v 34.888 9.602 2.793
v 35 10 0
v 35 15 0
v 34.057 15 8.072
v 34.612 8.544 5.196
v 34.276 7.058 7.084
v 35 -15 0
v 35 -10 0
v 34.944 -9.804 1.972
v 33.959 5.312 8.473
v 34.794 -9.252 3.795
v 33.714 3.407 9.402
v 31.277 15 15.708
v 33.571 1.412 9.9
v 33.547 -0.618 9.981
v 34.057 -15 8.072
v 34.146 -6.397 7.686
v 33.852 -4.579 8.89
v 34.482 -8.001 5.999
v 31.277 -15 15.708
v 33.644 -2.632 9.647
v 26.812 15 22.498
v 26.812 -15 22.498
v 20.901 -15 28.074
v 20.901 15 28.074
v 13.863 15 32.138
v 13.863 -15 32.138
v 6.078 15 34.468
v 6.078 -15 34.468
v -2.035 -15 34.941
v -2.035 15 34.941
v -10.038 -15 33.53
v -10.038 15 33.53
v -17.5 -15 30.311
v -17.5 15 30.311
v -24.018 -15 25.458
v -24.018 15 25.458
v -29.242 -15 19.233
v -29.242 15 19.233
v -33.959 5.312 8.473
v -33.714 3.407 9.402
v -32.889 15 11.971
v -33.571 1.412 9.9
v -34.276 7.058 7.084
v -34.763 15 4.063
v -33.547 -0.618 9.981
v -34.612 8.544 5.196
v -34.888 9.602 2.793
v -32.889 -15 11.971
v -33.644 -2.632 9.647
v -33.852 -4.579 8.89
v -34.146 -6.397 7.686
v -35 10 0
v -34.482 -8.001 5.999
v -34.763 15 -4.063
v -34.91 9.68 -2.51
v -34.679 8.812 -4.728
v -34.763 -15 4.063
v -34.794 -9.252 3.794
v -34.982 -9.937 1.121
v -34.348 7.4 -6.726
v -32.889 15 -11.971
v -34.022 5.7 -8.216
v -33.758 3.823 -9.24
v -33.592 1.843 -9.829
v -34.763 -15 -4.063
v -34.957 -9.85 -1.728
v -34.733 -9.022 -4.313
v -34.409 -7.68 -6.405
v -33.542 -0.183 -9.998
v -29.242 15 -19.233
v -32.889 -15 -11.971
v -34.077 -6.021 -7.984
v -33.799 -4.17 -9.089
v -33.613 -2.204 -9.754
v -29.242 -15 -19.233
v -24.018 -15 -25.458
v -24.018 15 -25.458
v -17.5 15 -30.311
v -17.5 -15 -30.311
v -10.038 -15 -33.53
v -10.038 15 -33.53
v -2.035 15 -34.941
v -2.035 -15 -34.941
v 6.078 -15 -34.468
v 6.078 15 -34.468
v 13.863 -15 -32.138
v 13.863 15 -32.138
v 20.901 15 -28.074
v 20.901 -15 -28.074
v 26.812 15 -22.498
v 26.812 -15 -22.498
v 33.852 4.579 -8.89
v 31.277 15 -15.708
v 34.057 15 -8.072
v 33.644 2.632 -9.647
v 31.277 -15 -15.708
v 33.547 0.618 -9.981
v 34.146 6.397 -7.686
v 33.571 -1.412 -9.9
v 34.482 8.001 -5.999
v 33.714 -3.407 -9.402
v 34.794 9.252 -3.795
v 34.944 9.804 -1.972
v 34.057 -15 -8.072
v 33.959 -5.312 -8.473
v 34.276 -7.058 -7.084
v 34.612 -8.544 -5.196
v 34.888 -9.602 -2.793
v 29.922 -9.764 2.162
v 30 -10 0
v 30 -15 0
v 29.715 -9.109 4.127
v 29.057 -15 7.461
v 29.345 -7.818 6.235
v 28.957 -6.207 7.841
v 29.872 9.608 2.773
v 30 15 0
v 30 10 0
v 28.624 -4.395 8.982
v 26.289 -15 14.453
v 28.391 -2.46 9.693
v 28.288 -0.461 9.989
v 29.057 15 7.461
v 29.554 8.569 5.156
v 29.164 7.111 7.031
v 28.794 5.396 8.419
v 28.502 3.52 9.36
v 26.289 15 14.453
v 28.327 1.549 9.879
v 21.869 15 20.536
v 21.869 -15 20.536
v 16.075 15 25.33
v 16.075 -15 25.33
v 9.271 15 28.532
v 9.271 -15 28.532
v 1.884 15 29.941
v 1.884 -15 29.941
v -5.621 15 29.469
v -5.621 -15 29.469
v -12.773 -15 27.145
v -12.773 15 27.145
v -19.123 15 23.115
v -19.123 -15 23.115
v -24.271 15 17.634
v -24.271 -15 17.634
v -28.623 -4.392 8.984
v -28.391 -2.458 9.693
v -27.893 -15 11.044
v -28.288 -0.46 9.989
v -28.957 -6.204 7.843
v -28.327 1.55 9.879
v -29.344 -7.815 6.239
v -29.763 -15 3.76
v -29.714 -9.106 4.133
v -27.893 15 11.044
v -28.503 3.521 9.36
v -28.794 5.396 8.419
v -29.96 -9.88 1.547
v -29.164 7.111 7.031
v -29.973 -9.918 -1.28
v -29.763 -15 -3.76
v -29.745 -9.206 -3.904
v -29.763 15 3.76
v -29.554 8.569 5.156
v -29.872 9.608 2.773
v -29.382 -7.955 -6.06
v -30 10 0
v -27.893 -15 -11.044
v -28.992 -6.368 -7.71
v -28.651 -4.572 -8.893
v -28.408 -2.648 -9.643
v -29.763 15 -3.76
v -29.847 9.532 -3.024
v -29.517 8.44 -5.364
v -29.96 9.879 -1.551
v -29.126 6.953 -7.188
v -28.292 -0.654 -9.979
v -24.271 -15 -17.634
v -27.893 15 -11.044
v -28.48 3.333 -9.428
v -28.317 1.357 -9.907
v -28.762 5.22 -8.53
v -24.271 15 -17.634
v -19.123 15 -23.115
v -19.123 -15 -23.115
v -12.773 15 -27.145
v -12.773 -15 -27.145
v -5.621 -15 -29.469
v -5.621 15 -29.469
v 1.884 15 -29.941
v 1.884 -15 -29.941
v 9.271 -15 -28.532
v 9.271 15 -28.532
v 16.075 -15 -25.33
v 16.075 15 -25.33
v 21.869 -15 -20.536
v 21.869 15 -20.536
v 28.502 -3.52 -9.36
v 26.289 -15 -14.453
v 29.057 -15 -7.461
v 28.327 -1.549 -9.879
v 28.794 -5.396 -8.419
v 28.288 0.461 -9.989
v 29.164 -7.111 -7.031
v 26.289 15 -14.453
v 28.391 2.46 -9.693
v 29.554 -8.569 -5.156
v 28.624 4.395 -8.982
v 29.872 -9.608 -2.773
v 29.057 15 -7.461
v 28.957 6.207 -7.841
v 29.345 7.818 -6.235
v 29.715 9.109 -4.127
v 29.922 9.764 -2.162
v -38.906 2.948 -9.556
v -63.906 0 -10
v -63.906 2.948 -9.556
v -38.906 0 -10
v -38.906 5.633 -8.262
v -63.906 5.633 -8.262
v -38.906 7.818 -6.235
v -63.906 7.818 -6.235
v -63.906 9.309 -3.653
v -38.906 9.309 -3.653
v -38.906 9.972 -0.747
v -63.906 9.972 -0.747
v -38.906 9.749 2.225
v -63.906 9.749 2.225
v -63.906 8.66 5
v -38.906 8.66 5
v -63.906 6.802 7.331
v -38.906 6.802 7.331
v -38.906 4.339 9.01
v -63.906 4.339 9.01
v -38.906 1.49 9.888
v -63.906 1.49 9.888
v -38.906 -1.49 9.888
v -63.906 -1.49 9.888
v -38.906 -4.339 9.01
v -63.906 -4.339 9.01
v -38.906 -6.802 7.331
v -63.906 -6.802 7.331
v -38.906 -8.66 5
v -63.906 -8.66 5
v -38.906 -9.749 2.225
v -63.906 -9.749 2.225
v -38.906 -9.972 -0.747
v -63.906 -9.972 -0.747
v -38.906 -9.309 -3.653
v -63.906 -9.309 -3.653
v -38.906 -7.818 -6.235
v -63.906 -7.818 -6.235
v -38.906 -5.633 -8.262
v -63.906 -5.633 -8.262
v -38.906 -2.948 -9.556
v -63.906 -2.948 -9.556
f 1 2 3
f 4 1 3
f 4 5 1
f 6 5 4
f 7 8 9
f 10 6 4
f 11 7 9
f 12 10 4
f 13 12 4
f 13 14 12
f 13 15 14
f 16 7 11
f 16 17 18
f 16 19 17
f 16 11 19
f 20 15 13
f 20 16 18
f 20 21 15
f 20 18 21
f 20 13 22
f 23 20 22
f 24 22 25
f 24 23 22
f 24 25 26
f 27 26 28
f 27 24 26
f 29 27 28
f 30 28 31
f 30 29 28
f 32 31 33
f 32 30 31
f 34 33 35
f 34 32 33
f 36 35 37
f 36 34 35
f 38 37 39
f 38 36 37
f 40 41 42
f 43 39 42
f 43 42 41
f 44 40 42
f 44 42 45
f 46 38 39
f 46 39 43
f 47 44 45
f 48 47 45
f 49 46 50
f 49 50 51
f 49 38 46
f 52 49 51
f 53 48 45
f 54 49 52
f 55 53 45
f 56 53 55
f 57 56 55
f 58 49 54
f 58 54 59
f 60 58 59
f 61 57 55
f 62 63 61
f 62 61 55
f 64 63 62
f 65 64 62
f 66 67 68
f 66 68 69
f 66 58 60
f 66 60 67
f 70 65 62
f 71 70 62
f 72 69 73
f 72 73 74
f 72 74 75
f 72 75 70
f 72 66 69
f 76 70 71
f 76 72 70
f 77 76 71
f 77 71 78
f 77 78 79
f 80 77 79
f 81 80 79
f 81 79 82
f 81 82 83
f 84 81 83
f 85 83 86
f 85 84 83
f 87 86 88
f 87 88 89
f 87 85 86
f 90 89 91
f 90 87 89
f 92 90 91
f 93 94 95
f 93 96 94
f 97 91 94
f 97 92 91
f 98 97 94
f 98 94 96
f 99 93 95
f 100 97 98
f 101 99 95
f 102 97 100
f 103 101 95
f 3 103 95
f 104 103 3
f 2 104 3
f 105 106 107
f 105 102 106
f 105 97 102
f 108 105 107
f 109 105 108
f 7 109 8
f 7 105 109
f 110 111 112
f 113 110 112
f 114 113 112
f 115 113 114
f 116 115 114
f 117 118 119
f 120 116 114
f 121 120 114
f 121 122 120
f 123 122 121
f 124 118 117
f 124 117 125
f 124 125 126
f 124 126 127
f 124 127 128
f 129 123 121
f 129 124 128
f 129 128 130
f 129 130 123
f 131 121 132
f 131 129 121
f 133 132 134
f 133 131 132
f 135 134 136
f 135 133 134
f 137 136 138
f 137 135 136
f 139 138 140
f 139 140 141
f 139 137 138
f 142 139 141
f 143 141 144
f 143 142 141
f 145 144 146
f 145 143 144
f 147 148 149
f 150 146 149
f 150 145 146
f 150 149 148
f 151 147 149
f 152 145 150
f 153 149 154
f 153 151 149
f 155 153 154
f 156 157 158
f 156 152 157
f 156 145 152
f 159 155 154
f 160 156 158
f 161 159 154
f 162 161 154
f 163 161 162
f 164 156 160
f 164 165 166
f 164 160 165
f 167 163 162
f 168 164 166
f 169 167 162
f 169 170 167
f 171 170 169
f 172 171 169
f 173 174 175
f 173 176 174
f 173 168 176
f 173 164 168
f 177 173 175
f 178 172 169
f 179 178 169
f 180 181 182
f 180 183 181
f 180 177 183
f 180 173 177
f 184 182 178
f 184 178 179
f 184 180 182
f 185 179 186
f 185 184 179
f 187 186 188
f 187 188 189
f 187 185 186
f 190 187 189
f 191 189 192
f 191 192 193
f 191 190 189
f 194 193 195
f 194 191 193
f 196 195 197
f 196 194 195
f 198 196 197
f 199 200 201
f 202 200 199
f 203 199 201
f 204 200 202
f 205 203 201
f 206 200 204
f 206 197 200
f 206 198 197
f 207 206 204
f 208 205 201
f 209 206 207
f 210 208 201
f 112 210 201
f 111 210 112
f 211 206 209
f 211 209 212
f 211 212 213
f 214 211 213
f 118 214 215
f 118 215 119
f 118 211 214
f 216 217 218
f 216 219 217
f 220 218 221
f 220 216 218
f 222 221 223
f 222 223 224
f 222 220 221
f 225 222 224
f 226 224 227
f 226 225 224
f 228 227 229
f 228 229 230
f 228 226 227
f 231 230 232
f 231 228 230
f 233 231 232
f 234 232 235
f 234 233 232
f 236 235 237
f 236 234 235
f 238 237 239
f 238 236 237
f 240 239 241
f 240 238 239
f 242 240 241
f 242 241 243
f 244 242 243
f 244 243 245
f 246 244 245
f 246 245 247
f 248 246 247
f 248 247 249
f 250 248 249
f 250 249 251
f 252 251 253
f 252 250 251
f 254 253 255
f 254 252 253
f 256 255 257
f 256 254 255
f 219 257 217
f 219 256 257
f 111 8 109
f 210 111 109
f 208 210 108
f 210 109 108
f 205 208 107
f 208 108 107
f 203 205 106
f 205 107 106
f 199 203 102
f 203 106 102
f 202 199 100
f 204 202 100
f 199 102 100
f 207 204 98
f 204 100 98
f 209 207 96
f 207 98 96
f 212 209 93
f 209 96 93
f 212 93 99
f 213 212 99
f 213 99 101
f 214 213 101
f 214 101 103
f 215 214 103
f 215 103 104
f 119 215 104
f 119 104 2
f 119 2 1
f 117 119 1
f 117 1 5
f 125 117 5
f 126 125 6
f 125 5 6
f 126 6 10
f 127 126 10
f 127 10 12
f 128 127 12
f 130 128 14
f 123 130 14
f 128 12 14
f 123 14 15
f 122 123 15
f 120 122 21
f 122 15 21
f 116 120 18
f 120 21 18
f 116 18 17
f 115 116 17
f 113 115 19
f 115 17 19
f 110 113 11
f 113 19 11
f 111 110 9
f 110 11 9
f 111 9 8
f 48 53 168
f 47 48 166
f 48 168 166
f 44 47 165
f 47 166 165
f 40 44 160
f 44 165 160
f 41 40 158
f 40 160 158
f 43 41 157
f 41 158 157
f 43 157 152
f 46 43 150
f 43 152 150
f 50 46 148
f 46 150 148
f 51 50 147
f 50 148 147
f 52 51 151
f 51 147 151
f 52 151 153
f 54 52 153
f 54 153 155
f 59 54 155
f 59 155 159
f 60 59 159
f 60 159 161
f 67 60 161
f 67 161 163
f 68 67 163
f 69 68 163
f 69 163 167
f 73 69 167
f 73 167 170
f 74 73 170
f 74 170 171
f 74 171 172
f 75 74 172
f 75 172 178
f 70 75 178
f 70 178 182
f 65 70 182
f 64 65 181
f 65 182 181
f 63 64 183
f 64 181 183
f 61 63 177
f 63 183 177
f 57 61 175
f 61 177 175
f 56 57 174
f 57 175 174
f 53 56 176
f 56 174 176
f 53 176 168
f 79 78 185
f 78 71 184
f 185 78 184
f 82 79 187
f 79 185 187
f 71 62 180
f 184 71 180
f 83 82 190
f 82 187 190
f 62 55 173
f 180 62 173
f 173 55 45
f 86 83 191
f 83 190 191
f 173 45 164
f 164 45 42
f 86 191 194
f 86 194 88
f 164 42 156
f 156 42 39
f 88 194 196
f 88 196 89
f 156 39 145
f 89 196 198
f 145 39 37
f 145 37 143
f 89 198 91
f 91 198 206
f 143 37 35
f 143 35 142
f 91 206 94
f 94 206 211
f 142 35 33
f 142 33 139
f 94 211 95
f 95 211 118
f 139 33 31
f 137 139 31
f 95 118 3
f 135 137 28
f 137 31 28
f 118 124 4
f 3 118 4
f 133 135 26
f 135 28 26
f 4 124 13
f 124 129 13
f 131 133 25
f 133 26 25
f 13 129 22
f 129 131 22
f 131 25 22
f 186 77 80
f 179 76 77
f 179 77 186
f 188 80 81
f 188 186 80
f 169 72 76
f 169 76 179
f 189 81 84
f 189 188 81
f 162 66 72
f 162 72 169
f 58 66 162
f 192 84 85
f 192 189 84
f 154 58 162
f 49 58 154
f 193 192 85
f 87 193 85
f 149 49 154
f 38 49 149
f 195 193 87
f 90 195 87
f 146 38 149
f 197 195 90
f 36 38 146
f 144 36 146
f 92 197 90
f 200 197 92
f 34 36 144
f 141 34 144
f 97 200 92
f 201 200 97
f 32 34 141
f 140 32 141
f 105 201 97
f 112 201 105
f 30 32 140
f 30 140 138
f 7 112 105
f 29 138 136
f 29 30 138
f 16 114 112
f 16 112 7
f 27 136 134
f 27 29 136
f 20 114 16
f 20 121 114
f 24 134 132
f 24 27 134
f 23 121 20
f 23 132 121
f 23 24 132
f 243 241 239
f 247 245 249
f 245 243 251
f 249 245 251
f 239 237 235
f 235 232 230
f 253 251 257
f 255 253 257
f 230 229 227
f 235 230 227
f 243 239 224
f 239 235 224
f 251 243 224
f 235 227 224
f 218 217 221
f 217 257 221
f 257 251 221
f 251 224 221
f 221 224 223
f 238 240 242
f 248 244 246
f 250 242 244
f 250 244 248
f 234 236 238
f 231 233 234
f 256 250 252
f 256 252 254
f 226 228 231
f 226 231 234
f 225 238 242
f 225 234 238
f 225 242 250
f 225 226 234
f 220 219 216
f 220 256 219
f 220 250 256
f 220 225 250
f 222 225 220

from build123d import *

# Parameters (mm, degrees)
F0_R     = 35
F0_R_2   = 30
F1_DEPTH = 15
F3_D     = 20
F3_DEPTH = 35.001
F4_W     = 25
F4_H     = 10
F7_D     = 20


with BuildPart() as f1:
    # F0 (on Front) → F1 (new body, symmetric)
    with BuildSketch(Plane.XZ):
        Circle(F0_R)
        Circle(F0_R_2, mode=Mode.SUBTRACT)
    extrude(amount=F1_DEPTH, both=True)

    # F3 (through all, one way)
    with BuildSketch(Plane.YZ):
        with Locations((0, 0)):
            Circle(F3_D / 2)
    extrude(amount=-F3_DEPTH, mode=Mode.SUBTRACT)

    # F7 (through all)
    with Locations(Plane(origin=(0, 0, 0), x_dir=(0, 1, 0), z_dir=(-1, 0, 0))):
        with Locations((0, 0)):
            Hole(F7_D / 2)


with BuildPart() as f5:
    # F4 (on Front) → F5 (revolve)
    with BuildSketch(Plane.XZ):
        with Locations((-51.4062489375, -5)):
            Rectangle(F4_W, F4_H)
    revolve(axis=Axis((-51.4062489375, 0, 0), (1, 0, 0)))


solid = Compound([f1.part, f5.part])
